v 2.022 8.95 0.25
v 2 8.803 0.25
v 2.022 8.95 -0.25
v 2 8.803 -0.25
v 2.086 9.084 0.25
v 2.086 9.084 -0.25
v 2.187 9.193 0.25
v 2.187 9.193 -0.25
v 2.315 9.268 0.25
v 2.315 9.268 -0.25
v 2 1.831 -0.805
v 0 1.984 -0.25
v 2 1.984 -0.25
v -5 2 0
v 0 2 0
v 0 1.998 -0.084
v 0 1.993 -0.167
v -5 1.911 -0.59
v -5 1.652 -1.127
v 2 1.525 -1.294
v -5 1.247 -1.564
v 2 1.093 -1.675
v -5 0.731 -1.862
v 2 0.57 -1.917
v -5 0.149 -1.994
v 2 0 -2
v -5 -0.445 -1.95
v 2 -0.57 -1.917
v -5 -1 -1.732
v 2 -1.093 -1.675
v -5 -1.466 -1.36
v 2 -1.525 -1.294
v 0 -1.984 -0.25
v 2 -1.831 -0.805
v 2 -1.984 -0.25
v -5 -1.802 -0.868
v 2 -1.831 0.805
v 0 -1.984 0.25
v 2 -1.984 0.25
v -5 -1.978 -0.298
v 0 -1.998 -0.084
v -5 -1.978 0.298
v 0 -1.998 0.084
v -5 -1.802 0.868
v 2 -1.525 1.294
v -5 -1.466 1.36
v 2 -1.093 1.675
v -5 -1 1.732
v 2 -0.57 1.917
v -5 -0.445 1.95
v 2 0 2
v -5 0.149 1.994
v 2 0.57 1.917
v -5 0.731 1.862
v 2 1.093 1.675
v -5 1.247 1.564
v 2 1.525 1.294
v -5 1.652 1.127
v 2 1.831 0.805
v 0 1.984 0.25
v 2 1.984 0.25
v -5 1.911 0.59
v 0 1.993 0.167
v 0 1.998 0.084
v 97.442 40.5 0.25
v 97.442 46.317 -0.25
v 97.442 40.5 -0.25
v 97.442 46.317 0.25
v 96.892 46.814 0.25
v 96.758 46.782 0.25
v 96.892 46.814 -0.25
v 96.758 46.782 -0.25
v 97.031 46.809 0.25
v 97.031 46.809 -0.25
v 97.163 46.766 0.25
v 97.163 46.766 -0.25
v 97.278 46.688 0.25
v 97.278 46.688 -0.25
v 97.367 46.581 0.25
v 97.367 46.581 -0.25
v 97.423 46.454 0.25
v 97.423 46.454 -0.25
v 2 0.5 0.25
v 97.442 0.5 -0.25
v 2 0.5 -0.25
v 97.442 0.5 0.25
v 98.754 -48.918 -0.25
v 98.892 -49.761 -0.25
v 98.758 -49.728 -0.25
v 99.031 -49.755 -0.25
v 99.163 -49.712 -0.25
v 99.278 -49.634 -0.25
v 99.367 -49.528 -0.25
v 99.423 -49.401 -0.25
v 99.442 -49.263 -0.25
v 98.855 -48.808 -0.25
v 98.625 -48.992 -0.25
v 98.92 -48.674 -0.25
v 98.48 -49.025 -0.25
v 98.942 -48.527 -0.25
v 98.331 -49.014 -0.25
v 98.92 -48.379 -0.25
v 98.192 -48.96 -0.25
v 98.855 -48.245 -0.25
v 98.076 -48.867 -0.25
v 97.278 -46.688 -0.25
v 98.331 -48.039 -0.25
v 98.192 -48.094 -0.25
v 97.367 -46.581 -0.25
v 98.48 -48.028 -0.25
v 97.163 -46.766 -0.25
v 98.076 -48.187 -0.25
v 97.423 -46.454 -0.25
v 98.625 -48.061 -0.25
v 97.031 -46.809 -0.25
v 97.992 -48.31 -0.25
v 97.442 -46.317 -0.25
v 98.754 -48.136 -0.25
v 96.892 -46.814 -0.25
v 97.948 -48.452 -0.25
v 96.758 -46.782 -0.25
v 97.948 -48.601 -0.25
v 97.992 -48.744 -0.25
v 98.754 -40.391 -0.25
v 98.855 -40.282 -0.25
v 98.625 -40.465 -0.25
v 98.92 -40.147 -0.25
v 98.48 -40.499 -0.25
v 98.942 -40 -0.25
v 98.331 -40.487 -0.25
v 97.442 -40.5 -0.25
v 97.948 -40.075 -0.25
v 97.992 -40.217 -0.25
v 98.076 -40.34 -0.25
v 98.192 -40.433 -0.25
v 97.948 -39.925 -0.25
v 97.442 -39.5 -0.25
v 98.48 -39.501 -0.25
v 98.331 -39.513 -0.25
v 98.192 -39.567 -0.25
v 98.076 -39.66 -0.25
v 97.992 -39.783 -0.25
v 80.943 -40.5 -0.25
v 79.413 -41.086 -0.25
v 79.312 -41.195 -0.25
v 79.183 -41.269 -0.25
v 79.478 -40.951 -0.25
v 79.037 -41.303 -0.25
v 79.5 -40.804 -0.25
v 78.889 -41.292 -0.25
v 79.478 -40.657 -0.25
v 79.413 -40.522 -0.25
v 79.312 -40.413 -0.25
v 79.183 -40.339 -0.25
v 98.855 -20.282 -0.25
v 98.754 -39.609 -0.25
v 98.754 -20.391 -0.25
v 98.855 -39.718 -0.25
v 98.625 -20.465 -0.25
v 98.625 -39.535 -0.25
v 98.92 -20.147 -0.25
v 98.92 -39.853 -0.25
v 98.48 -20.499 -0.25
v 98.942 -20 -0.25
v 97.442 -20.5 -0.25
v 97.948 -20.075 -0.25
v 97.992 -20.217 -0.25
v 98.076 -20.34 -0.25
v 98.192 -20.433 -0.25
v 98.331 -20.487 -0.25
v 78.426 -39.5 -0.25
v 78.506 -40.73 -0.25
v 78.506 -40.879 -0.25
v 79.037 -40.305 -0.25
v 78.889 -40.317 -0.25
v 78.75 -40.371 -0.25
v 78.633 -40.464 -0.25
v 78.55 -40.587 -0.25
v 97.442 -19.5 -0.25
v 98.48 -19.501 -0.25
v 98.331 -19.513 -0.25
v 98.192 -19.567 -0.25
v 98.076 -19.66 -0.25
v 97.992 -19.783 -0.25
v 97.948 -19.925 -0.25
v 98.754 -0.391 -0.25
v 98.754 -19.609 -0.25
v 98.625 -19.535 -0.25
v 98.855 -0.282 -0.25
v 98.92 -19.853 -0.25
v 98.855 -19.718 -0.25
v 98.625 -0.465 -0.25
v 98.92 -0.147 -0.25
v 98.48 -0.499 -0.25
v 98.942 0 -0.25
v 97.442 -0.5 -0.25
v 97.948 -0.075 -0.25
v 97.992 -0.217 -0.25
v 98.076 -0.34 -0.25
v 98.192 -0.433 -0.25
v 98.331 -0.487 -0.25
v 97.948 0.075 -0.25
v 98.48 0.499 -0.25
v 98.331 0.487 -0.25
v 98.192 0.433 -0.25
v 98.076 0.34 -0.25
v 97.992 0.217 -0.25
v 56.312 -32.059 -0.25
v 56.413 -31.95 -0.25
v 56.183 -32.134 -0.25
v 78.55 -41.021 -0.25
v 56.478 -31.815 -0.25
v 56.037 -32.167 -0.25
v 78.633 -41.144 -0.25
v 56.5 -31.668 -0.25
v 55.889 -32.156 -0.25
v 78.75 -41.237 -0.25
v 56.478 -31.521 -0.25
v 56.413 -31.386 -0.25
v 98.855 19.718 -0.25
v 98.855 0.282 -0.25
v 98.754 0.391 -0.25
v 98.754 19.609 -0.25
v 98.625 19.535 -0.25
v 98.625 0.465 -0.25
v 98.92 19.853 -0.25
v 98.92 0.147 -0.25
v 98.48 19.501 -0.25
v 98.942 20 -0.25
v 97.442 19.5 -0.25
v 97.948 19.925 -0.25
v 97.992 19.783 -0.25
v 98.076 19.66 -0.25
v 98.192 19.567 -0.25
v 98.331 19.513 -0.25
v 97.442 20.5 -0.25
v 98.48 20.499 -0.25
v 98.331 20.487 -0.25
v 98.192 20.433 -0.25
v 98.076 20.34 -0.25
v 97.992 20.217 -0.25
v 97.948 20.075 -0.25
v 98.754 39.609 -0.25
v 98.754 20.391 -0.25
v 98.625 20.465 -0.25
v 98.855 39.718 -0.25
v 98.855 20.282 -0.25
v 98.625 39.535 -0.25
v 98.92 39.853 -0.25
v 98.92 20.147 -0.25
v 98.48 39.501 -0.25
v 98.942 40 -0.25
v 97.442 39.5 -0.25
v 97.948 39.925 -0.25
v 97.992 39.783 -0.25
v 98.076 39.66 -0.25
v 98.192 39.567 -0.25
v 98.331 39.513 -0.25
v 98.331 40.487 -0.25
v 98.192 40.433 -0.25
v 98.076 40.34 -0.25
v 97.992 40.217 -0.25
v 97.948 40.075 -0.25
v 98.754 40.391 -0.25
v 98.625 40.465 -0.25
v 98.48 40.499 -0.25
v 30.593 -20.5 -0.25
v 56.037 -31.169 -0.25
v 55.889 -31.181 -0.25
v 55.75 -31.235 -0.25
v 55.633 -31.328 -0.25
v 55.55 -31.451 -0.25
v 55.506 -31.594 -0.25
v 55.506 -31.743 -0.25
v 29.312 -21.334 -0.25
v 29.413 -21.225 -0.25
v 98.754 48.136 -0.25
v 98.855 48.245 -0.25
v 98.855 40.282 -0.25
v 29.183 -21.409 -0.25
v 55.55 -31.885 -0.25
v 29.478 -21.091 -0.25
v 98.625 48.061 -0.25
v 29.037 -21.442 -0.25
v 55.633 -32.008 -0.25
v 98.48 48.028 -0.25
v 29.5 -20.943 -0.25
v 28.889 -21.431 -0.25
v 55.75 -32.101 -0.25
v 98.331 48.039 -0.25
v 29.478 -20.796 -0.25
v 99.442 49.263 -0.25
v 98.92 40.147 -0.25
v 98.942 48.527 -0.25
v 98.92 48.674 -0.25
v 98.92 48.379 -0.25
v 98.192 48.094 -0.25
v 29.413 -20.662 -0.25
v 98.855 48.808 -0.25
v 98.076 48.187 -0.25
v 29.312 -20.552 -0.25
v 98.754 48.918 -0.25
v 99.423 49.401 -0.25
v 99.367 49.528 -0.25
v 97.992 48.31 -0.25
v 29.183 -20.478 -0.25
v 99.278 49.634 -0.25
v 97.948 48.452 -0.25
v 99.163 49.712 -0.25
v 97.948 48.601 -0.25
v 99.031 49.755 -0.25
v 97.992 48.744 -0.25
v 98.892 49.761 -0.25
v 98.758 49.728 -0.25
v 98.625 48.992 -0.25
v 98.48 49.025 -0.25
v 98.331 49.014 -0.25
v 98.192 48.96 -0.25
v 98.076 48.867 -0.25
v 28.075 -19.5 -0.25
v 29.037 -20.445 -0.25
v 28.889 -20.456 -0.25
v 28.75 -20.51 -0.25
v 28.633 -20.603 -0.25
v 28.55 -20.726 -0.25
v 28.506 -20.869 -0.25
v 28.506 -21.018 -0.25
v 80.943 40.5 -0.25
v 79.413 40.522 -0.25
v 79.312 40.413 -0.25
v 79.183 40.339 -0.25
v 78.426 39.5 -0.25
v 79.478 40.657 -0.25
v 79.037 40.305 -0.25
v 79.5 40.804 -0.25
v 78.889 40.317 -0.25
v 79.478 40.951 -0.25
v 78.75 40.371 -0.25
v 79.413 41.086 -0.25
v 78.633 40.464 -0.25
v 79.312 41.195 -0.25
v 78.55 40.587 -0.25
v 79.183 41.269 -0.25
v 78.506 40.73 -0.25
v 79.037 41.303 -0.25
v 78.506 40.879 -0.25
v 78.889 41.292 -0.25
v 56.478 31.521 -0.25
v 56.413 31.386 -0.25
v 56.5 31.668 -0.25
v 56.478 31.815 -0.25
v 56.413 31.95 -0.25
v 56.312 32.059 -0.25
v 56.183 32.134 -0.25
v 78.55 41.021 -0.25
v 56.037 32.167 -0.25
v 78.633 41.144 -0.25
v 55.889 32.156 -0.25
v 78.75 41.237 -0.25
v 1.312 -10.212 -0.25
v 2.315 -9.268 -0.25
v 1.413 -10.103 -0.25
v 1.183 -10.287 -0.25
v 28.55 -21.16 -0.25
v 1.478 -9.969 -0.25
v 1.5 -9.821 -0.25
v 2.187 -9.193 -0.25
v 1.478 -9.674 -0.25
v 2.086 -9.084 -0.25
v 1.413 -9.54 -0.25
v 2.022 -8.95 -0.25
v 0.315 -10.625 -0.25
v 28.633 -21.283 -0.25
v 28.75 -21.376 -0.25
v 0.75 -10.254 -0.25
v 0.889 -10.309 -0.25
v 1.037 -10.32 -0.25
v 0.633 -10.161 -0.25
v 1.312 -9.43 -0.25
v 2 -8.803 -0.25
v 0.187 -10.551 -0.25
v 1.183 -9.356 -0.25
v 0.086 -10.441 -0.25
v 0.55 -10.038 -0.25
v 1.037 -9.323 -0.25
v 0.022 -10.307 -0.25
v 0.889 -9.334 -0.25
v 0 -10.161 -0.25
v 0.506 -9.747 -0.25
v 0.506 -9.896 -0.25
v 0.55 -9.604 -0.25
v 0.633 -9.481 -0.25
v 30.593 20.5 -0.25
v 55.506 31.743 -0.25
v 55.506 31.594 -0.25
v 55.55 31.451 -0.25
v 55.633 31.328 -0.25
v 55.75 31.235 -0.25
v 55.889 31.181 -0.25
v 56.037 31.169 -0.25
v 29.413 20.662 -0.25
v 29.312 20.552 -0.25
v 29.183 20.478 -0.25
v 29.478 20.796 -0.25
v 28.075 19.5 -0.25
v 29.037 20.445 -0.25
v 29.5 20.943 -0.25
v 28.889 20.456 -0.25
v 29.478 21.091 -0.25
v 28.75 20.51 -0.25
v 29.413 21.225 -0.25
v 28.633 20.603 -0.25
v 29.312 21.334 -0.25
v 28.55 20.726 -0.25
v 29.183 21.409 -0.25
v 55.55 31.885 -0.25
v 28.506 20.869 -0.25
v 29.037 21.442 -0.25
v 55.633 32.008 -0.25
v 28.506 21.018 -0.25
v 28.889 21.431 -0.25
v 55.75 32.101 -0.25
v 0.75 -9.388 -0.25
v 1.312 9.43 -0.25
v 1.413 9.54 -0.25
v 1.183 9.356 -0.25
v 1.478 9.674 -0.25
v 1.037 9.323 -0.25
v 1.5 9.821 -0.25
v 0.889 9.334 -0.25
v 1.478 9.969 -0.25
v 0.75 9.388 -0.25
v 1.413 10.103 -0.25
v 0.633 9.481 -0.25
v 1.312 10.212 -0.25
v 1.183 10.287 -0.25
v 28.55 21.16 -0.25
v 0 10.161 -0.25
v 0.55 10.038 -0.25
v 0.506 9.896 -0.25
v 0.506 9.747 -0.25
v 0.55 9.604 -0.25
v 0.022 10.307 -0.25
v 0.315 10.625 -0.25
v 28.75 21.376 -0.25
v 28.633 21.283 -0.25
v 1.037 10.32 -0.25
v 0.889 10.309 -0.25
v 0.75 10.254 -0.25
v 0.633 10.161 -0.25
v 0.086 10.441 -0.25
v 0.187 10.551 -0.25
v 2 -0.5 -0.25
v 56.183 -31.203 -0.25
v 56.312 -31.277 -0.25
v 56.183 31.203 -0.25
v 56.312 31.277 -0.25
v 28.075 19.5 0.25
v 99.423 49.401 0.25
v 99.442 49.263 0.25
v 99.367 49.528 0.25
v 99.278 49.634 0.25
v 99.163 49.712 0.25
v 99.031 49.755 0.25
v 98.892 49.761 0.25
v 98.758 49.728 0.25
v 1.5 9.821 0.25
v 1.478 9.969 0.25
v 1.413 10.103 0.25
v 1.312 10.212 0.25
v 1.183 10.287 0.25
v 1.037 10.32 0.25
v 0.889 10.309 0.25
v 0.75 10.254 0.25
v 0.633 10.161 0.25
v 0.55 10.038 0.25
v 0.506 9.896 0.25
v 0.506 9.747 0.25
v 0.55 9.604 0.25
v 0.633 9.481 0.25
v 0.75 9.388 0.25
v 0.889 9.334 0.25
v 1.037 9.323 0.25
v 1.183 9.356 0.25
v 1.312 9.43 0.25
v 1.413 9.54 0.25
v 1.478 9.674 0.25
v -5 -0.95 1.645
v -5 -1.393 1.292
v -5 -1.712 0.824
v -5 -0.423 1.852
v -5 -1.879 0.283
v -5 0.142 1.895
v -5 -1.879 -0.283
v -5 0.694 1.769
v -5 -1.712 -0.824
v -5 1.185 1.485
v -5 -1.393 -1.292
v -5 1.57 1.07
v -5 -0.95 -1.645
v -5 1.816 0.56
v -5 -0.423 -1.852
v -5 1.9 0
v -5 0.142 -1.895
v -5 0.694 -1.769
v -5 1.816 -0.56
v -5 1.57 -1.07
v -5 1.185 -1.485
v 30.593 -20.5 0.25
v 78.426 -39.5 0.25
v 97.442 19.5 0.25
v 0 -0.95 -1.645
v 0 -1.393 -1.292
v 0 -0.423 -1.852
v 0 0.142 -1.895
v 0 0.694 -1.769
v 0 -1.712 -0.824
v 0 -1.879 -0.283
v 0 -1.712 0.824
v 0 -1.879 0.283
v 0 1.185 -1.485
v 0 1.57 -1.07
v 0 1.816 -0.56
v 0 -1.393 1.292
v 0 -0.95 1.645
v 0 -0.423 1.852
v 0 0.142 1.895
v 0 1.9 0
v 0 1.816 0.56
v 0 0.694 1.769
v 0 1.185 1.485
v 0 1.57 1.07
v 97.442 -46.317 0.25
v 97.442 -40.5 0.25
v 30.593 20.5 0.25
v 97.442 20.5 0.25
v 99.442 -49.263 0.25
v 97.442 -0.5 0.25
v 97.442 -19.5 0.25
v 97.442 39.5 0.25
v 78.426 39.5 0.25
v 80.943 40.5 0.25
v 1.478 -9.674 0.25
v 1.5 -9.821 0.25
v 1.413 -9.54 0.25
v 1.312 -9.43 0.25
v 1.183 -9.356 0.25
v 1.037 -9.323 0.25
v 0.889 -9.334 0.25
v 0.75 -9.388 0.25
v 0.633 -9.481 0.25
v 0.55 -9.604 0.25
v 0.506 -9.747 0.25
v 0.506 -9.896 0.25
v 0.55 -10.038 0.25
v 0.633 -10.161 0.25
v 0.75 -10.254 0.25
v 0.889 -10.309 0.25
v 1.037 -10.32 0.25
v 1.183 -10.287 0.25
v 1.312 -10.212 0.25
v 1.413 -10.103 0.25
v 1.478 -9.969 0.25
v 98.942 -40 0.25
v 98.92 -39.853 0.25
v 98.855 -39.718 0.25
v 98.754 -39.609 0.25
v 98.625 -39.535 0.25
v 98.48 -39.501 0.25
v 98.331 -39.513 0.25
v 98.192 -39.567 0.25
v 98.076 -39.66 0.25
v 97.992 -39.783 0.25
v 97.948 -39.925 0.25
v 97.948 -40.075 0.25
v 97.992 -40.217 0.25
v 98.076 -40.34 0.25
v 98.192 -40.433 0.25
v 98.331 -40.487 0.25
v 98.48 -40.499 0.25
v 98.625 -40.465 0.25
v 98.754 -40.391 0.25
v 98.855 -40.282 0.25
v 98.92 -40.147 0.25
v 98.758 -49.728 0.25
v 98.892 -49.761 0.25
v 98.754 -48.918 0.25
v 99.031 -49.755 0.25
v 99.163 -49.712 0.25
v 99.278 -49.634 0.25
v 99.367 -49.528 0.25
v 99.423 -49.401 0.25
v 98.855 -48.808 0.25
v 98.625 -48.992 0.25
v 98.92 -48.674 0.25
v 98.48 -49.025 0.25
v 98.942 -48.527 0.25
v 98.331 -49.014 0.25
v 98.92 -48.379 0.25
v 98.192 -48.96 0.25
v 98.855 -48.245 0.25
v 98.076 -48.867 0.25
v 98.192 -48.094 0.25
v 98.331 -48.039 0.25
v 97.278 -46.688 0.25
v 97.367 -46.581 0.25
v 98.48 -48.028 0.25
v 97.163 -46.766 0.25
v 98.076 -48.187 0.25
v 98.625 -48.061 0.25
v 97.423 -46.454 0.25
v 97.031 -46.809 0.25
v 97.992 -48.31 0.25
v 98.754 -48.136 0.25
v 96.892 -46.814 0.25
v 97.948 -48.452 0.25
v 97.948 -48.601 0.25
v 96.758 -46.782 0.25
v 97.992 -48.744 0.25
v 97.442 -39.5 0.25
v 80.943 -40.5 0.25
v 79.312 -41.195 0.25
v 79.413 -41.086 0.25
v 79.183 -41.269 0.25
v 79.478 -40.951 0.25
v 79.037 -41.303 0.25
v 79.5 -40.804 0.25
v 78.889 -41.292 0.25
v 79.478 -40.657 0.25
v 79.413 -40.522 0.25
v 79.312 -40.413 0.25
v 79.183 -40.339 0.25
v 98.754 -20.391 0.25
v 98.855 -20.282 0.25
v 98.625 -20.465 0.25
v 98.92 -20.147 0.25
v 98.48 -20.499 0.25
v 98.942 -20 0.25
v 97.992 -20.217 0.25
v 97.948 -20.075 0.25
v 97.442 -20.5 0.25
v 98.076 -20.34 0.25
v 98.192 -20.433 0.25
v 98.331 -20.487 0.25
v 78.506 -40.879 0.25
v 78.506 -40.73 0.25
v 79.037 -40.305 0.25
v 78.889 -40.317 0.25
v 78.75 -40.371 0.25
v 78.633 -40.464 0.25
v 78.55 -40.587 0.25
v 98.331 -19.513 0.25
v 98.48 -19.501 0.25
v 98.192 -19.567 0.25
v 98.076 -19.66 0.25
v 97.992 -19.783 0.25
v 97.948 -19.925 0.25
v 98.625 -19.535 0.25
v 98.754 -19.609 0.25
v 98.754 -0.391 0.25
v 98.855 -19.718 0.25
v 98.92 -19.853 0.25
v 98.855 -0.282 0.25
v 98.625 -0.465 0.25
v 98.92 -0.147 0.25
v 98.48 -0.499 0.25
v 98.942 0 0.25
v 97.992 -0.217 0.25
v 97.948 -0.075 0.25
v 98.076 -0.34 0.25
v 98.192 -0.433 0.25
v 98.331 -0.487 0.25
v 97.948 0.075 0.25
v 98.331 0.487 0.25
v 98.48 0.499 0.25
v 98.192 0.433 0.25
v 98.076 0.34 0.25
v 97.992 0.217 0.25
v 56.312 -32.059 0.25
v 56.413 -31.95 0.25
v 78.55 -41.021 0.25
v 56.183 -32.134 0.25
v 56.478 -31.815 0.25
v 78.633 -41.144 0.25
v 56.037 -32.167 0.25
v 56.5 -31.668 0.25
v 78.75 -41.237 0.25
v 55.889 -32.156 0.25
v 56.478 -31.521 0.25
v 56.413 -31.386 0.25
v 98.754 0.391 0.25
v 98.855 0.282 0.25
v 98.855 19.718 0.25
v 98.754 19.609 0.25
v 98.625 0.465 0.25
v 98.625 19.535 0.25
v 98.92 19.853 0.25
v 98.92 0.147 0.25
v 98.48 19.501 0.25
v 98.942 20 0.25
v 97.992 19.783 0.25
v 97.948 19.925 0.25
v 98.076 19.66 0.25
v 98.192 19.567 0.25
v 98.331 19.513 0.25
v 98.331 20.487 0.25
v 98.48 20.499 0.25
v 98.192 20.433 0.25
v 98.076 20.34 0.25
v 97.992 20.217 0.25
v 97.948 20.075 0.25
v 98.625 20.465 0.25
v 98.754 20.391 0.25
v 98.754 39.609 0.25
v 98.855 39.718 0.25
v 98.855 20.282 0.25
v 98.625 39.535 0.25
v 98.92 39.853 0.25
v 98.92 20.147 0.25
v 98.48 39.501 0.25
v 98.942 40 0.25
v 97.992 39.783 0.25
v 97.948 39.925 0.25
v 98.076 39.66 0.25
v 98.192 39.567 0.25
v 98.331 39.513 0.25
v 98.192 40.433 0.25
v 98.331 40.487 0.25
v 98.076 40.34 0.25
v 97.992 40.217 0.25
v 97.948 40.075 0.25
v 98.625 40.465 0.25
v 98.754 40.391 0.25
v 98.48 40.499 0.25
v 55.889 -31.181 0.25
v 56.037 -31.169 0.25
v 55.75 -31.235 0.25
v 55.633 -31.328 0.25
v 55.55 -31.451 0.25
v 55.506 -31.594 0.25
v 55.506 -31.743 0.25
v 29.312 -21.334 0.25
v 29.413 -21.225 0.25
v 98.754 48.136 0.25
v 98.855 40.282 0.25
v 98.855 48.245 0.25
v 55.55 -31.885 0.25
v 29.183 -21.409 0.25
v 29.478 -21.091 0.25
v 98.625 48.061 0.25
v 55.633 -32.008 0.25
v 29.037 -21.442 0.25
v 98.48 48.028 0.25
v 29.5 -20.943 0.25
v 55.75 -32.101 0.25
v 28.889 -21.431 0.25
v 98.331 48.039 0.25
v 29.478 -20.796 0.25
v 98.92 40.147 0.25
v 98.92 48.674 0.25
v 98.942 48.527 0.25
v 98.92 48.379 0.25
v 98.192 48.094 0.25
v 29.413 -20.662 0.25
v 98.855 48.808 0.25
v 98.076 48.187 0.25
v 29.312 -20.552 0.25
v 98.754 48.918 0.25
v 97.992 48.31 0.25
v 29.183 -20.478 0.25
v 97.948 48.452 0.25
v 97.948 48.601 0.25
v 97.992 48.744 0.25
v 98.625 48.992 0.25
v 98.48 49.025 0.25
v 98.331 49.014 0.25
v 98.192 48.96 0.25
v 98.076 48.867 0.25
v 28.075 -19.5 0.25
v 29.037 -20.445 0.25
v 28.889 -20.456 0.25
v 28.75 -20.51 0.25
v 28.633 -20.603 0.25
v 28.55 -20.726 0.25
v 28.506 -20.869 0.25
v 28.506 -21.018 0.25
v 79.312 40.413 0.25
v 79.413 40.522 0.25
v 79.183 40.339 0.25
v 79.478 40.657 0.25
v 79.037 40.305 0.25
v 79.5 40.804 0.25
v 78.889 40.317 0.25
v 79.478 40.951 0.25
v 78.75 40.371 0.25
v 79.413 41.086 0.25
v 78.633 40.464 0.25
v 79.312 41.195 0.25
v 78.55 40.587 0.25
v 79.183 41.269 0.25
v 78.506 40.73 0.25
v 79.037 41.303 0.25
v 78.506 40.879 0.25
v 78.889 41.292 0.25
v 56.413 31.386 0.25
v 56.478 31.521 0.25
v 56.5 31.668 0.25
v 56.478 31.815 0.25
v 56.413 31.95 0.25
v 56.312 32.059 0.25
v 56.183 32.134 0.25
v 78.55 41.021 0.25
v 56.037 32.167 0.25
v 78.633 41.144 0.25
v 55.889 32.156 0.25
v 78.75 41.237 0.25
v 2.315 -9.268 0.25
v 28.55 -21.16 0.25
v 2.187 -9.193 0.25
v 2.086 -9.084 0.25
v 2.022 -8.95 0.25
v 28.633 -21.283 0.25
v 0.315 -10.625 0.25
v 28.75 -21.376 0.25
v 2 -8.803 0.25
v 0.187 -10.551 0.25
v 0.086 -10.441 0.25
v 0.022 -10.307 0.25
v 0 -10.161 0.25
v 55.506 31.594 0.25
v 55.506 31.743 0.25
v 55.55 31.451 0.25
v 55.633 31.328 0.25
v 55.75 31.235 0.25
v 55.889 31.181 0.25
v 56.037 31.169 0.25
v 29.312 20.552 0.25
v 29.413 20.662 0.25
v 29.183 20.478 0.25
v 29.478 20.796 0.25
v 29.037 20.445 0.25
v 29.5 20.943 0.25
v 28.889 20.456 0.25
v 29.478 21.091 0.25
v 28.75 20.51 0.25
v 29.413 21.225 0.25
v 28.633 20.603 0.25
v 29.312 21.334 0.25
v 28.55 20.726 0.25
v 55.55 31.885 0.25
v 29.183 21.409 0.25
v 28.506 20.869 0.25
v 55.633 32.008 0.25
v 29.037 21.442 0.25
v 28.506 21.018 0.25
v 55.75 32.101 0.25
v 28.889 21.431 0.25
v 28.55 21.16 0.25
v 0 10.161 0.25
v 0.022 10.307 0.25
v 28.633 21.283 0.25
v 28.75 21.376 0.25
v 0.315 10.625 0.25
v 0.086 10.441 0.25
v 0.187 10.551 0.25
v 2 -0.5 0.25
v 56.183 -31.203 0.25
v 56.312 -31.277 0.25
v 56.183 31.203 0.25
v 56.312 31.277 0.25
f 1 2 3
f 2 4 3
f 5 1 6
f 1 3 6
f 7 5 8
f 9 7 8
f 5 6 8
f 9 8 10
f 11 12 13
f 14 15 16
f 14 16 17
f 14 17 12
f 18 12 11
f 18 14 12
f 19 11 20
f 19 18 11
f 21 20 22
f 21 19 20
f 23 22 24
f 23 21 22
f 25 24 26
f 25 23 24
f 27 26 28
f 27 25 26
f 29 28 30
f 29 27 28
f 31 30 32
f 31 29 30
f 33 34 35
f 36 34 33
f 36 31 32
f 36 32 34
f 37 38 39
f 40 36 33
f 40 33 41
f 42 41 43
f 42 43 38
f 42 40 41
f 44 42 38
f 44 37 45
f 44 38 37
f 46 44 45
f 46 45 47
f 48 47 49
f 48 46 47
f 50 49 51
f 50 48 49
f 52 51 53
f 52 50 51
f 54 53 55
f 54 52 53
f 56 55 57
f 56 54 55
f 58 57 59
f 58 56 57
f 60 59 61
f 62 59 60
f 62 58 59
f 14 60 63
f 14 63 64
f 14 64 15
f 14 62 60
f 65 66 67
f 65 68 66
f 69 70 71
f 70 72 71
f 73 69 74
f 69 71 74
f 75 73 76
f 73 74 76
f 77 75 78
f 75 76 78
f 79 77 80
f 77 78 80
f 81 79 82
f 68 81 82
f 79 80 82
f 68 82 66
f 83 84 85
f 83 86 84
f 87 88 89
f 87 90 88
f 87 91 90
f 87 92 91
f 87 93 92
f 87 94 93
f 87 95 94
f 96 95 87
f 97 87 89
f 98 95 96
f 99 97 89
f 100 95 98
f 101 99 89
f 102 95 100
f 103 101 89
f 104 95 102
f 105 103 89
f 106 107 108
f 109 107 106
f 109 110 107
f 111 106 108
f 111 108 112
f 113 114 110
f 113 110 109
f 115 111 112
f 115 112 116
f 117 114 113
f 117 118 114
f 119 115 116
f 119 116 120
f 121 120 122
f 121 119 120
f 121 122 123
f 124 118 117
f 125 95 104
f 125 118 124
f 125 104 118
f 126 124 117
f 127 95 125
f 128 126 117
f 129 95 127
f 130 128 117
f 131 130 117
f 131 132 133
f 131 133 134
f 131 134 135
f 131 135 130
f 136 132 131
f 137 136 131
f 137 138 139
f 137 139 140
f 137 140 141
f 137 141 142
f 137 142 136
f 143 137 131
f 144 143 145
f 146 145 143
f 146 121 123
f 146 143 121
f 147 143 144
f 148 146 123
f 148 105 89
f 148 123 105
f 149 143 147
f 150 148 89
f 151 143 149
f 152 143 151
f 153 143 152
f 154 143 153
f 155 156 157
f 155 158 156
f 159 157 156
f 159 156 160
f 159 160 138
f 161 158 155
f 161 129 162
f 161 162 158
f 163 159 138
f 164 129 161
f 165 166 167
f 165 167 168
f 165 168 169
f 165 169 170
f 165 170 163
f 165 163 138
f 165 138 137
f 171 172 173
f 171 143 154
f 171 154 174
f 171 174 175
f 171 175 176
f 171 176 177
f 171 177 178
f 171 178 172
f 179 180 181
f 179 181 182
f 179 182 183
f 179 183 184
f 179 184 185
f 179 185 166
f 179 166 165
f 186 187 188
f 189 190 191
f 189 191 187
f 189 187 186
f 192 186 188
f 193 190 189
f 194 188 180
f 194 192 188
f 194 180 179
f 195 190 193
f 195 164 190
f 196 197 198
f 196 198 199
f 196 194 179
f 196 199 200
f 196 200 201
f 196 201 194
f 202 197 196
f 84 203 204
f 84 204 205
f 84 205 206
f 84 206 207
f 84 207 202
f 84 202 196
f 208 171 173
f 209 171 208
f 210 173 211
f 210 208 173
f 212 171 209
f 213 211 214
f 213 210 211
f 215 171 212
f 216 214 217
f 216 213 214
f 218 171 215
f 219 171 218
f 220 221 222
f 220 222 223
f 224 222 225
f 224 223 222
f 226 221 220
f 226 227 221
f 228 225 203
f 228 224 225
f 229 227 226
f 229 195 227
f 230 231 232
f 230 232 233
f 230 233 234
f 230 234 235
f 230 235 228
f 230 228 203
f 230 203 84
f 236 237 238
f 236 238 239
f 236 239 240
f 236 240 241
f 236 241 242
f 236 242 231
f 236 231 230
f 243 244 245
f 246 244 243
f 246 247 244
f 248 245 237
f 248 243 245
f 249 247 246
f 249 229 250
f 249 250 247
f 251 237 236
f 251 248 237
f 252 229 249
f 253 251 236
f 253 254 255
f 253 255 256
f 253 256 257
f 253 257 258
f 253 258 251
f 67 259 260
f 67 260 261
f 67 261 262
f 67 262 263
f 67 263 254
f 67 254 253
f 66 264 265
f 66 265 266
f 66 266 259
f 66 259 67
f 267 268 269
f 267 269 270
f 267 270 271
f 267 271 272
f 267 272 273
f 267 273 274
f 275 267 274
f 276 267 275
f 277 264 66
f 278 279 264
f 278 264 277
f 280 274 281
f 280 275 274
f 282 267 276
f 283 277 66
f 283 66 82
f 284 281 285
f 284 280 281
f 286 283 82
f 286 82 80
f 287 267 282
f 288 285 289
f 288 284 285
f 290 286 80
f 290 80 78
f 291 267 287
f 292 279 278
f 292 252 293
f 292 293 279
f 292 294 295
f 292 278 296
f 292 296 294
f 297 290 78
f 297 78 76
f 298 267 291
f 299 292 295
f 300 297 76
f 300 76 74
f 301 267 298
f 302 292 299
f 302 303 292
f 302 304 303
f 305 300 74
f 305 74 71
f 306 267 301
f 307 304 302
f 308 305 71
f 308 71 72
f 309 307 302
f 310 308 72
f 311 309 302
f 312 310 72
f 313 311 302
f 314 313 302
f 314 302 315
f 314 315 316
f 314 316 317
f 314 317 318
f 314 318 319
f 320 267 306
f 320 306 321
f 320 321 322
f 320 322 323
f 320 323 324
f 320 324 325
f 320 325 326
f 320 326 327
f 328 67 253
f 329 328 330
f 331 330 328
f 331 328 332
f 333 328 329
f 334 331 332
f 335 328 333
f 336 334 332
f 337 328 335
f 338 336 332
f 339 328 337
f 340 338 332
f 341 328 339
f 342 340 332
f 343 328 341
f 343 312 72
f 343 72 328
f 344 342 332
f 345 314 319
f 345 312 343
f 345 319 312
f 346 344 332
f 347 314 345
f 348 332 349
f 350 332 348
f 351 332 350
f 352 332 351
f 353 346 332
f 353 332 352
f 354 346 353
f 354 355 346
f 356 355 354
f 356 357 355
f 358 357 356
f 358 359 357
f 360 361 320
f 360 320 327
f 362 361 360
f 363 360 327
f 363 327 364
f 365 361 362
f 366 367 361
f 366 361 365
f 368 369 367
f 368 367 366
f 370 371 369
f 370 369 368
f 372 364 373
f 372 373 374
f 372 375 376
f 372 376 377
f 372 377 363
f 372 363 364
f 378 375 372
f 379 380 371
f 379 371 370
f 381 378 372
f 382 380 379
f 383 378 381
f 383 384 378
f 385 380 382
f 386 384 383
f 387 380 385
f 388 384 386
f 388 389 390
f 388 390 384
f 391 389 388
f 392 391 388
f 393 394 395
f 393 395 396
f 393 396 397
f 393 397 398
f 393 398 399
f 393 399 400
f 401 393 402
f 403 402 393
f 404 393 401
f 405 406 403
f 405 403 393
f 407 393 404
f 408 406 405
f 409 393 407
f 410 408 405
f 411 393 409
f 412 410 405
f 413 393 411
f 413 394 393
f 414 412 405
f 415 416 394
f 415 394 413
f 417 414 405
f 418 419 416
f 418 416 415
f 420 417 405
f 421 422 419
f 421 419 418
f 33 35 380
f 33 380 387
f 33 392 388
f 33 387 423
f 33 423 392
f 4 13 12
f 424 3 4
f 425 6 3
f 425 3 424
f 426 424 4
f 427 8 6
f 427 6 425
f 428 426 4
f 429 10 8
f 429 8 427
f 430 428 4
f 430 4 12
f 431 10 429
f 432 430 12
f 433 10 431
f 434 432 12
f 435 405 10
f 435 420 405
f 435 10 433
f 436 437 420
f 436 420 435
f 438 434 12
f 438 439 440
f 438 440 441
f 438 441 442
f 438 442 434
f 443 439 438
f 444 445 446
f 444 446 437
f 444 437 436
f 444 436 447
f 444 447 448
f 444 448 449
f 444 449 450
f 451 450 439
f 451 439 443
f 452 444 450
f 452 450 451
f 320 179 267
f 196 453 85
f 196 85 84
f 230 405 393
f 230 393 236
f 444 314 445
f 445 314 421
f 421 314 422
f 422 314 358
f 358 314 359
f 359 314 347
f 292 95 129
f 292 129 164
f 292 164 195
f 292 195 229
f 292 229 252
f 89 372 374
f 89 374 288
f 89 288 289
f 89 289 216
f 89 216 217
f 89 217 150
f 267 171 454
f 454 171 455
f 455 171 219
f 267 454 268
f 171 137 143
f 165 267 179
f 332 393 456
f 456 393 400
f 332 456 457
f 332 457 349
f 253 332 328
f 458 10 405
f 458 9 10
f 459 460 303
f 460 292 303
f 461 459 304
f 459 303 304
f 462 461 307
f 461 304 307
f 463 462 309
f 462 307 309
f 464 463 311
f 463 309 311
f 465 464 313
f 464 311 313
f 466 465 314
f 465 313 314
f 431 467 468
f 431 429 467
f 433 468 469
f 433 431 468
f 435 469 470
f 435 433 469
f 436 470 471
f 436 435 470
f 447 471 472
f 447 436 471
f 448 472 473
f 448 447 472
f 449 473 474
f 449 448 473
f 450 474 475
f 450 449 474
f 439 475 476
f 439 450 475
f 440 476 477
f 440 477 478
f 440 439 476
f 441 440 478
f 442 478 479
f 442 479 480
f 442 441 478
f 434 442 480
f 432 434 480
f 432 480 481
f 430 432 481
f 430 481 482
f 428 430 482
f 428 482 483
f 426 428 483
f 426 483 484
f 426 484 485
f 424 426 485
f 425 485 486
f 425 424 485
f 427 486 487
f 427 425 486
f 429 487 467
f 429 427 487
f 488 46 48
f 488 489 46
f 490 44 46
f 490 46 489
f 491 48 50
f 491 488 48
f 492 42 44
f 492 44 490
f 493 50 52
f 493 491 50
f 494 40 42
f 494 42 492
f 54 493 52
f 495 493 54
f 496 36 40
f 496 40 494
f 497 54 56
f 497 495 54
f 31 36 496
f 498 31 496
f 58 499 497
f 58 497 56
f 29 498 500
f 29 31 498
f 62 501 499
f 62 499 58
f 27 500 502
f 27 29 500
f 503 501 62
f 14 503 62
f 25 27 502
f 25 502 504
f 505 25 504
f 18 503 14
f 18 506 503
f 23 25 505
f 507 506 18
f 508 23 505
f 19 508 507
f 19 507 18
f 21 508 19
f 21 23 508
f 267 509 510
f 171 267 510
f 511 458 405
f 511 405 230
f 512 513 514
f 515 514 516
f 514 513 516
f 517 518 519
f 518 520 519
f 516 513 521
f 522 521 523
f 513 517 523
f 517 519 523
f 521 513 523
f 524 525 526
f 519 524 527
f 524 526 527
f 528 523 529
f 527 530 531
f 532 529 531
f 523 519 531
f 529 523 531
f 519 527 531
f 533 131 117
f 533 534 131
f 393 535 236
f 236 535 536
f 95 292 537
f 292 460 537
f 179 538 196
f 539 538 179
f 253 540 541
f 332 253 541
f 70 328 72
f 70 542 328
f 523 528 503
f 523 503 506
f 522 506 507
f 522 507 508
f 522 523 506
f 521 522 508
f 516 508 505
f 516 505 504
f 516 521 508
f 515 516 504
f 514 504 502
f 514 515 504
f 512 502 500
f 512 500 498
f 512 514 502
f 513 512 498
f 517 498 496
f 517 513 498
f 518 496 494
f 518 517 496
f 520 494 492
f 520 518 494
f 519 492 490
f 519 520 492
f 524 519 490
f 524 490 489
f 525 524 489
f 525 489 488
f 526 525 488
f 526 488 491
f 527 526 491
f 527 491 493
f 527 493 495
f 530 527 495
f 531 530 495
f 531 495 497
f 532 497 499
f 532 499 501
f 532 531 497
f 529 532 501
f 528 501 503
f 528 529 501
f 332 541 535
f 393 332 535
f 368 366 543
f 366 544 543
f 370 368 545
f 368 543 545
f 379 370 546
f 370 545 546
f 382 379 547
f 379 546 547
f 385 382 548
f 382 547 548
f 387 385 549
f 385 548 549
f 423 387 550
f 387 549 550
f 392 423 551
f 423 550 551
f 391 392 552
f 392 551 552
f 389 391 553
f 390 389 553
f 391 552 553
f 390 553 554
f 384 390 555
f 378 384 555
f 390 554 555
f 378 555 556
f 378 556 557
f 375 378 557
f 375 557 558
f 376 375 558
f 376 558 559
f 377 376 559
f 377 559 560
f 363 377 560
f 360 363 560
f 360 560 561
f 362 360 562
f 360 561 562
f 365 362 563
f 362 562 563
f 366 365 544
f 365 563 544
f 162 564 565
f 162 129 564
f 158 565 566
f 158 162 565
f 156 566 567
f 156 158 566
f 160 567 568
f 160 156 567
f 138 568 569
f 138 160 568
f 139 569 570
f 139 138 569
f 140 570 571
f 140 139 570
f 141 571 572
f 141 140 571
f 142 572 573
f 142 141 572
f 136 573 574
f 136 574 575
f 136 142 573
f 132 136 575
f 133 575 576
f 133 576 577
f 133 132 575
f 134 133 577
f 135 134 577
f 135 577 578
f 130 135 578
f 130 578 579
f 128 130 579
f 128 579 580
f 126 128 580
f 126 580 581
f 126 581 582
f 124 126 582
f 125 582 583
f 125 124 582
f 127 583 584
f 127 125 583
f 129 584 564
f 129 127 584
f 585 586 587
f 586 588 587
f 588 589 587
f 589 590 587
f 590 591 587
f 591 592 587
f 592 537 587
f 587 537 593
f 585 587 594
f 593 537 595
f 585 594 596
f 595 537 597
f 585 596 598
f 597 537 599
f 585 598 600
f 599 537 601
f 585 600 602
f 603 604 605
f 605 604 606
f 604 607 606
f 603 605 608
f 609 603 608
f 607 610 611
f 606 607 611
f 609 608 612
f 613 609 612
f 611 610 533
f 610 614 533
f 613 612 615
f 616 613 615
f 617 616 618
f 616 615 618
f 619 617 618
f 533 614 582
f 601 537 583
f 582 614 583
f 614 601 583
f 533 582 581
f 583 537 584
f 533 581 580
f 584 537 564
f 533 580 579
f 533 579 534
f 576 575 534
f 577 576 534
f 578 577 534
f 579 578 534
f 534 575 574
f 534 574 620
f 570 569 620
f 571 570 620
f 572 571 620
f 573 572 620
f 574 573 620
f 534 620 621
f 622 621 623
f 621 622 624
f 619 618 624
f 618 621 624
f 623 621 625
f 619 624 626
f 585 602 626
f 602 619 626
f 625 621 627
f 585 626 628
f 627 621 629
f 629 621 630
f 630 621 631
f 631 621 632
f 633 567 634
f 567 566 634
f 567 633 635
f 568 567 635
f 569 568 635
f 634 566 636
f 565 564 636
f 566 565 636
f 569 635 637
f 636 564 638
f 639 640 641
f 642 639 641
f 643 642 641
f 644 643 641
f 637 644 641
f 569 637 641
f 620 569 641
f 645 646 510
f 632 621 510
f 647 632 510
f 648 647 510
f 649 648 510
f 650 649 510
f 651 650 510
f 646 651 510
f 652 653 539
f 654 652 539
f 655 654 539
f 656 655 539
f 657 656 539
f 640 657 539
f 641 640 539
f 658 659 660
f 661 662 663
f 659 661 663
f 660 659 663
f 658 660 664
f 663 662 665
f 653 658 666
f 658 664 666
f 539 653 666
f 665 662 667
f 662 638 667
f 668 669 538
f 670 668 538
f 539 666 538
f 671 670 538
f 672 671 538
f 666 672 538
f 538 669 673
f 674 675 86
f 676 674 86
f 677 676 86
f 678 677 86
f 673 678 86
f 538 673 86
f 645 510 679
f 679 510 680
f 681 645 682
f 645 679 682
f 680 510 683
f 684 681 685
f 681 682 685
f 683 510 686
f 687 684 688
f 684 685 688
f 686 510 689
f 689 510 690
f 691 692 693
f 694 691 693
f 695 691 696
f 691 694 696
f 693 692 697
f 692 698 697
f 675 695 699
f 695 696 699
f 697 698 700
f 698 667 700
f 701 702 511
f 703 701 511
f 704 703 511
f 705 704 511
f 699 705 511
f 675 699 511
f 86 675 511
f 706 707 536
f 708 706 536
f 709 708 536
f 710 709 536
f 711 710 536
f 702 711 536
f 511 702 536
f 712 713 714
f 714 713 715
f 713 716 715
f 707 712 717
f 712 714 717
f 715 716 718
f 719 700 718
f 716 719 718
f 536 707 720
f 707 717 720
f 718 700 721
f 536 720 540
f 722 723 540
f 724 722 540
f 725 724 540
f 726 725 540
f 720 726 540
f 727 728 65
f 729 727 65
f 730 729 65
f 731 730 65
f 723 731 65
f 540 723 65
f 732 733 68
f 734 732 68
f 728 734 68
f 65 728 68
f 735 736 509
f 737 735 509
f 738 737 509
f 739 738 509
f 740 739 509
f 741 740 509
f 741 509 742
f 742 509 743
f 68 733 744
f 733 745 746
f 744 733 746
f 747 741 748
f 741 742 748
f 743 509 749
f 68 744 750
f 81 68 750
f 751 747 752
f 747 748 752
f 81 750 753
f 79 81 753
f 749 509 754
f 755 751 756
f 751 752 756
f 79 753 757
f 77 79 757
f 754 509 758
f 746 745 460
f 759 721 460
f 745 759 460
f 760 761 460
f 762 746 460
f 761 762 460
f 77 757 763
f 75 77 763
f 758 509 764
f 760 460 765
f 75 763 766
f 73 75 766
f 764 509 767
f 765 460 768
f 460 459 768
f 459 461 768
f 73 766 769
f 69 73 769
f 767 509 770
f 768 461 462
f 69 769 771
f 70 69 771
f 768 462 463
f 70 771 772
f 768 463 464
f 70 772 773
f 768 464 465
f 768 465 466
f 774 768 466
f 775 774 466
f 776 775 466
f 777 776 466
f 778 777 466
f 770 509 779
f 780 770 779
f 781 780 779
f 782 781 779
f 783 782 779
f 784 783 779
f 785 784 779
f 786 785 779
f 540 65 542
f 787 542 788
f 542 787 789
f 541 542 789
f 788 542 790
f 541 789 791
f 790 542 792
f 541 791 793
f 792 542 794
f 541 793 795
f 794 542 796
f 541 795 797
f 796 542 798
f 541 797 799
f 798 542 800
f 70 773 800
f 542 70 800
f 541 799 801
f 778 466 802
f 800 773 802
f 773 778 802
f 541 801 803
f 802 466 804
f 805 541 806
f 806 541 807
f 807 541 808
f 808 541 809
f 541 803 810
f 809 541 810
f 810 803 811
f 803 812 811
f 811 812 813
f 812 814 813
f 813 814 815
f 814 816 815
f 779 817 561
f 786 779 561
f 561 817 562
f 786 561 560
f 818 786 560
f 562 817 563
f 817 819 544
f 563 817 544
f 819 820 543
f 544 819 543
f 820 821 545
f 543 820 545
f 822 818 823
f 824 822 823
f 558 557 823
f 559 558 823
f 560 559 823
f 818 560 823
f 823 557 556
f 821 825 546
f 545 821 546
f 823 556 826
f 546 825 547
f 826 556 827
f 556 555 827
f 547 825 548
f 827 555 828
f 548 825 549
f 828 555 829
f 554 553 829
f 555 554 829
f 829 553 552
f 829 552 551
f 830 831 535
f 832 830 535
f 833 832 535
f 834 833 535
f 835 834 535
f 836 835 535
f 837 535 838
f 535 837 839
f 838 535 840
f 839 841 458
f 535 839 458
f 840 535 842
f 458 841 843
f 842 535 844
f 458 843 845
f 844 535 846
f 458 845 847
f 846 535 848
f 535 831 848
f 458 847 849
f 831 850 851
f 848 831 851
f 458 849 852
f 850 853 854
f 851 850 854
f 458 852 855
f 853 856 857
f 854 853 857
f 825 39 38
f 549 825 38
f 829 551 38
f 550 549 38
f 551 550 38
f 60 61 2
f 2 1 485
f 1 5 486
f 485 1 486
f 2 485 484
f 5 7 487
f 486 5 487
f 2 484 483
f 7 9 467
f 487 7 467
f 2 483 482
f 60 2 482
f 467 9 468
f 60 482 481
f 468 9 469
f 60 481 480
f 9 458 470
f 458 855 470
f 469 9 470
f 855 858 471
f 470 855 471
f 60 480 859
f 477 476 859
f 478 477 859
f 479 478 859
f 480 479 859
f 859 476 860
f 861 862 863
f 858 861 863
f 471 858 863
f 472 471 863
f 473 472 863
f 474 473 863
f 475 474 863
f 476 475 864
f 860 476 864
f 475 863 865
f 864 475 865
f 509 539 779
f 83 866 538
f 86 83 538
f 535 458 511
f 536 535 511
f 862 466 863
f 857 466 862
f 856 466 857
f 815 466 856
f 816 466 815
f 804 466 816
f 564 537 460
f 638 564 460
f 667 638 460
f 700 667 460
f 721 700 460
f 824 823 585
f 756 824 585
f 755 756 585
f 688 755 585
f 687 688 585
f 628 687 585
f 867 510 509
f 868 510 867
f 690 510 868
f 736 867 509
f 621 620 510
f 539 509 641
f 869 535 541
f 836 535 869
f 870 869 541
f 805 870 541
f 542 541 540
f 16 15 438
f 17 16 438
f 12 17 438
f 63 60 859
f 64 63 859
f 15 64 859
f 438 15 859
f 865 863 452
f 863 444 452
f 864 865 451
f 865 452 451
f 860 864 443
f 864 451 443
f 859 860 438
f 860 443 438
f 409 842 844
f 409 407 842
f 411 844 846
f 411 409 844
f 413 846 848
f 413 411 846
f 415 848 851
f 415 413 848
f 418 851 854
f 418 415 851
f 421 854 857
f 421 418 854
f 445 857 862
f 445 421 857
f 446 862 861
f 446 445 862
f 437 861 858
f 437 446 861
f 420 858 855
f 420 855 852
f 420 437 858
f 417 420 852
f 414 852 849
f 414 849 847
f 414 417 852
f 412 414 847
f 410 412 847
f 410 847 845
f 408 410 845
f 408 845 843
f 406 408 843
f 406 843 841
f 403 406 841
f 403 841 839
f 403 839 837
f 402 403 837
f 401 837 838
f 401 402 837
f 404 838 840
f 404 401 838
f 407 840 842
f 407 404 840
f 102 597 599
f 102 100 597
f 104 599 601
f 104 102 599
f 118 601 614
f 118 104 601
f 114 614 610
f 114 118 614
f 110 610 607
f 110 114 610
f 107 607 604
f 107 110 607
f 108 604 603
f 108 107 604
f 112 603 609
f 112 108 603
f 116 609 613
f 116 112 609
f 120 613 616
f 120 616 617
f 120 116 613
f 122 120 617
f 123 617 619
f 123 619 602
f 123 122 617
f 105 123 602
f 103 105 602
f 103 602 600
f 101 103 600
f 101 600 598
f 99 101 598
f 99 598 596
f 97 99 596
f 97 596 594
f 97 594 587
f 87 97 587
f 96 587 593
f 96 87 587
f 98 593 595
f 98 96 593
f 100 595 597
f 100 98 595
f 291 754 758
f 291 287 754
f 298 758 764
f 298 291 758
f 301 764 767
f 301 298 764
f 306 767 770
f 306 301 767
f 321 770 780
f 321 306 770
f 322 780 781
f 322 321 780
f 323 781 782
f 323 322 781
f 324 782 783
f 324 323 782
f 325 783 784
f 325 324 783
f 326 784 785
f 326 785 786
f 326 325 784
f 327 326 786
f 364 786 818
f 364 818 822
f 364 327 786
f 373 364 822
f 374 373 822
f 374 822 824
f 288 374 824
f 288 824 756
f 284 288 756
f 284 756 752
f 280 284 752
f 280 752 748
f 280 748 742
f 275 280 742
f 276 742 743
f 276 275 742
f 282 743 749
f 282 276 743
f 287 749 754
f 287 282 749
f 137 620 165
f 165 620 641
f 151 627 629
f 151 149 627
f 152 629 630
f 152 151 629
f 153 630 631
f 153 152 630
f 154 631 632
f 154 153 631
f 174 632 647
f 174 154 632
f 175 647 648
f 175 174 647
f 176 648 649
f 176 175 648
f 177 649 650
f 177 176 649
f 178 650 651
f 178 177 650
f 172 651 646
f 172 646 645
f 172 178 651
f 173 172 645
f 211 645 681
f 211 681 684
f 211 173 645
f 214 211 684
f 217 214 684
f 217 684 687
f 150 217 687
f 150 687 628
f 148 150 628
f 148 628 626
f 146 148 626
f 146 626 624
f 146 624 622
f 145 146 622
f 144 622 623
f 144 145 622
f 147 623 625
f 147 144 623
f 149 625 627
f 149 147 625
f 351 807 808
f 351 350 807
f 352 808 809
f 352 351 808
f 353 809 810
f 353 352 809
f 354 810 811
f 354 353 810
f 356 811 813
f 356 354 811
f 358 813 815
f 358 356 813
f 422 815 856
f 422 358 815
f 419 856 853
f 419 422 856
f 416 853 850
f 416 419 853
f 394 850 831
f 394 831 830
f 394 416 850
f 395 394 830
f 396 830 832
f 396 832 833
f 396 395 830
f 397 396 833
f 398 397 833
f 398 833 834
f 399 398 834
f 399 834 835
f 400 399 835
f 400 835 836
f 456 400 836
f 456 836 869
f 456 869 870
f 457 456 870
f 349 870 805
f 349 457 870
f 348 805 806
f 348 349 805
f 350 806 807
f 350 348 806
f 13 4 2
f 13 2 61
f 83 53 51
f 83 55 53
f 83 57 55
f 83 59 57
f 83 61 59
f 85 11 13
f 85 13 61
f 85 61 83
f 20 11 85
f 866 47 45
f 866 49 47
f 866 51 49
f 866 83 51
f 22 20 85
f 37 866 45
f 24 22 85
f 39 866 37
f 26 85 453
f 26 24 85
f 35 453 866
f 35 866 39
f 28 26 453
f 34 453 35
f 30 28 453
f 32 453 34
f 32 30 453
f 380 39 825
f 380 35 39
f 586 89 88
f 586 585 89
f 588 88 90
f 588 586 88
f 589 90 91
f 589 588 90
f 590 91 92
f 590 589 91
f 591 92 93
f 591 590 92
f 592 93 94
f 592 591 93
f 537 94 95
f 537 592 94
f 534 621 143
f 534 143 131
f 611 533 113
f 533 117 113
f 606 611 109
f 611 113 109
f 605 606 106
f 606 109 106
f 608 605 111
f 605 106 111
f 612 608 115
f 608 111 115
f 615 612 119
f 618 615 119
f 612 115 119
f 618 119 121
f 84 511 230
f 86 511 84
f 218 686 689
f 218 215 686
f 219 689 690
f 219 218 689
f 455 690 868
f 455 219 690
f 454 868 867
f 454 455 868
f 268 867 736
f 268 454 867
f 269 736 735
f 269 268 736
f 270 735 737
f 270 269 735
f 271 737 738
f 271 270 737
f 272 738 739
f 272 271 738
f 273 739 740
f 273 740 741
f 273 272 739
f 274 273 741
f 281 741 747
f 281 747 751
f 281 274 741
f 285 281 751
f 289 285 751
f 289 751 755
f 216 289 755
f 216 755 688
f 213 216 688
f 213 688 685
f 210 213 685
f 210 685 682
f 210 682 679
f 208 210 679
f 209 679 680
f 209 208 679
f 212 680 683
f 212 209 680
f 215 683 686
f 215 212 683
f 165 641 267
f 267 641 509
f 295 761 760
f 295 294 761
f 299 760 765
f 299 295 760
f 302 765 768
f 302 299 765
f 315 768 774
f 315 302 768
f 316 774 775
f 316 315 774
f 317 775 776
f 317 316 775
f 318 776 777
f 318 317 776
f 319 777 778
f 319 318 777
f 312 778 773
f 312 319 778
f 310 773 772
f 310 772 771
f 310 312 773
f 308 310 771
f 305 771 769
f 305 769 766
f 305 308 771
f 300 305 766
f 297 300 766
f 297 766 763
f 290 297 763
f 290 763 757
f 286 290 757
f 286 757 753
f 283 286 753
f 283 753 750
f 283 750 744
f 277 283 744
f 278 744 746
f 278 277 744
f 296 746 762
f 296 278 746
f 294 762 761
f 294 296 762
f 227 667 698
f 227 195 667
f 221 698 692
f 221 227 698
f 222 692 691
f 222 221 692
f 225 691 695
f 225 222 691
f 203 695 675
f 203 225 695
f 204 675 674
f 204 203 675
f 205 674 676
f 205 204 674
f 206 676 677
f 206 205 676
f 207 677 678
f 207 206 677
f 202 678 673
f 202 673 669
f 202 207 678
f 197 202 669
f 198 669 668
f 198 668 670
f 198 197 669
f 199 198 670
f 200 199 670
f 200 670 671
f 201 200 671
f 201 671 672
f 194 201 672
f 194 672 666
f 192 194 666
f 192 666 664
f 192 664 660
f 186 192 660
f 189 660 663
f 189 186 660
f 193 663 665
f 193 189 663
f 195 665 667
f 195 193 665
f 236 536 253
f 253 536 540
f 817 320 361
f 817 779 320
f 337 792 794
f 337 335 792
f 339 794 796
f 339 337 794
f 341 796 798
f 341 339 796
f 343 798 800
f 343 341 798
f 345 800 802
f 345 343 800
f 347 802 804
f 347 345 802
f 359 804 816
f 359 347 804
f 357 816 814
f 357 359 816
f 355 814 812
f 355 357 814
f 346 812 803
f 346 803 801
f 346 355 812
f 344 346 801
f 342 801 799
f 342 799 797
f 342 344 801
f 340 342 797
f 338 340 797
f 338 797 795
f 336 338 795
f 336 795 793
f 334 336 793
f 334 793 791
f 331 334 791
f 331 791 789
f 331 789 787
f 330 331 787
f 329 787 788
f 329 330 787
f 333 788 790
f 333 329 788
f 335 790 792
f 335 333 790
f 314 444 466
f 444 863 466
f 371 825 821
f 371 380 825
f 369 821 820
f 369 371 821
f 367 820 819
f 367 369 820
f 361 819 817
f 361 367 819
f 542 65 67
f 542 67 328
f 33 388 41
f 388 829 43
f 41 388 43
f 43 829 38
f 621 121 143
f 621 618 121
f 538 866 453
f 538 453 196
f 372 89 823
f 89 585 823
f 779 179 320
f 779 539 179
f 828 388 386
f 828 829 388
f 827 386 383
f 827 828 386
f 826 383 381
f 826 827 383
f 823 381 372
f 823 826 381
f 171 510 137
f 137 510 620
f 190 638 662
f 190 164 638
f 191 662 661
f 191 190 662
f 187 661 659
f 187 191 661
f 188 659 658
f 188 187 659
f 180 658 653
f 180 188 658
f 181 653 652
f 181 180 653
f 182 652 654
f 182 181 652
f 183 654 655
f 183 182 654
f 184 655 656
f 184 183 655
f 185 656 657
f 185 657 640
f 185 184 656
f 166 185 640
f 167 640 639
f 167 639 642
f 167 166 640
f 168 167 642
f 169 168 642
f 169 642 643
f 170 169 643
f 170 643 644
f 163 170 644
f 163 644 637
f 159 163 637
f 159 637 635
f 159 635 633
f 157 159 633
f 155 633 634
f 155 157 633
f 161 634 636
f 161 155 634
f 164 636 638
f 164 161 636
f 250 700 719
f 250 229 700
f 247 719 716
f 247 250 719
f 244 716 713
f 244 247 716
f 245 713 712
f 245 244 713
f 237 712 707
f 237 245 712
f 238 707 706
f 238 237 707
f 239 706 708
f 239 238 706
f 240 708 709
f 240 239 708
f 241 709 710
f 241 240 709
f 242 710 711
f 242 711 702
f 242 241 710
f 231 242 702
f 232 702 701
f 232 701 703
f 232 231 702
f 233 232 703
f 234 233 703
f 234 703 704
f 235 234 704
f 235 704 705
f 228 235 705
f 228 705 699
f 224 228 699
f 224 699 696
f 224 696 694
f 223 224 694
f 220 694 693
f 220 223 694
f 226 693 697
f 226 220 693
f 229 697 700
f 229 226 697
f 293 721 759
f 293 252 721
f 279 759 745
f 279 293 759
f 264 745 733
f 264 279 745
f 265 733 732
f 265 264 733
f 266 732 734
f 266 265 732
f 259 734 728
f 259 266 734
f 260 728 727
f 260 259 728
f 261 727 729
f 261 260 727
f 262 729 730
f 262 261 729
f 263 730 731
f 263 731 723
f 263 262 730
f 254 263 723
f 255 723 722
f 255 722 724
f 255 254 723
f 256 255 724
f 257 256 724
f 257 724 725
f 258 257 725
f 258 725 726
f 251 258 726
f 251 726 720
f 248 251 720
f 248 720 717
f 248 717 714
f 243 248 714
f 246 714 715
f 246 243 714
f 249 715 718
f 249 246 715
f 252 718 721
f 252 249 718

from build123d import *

# Parameters (mm, degrees)
EXTRUDE_1_DEPTH     = 0.25
SKETCH_4_R          = 0.5
CUT_EXTRUDE_1_DEPTH = 0.25
FILLET_1_R          = 0.5


with BuildPart() as part:
    # 草图1 → 凸台-拉伸1 (new body, symmetric)
    with BuildSketch(Plane.XY):
        Polygon((0, -10.5), (0, 10.5), (99.442194264, 50), (99.442194264, -50), align=None)
        Polygon((2, 9.142427382), (28.075436668, 19.5), (97.442194264, 19.5), (97.442194264, 0.5), (2, 0.5), align=None, mode=Mode.SUBTRACT)
        Polygon((97.442194264, 47.053564614), (97.442194264, 40.5), (80.943438681, 40.5), align=None, mode=Mode.SUBTRACT)
        Polygon((97.442194264, -47.053564614), (80.943438681, -40.5), (97.442194264, -40.5), align=None, mode=Mode.SUBTRACT)
        Polygon((2, -9.142427382), (2, -0.5), (97.442194264, -0.5), (97.442194264, -19.5), (28.075436668, -19.5), align=None, mode=Mode.SUBTRACT)
        Polygon((30.592960573, 20.5), (97.442194264, 20.5), (97.442194264, 39.5), (78.425914776, 39.5), align=None, mode=Mode.SUBTRACT)
        Polygon((78.425914776, -39.5), (97.442194264, -39.5), (97.442194264, -20.5), (30.592960573, -20.5), align=None, mode=Mode.SUBTRACT)
    extrude(amount=EXTRUDE_1_DEPTH, both=True)

    # 草图4 → 切除-拉伸1 (cut, symmetric)
    with BuildSketch(Plane.XY):
        with Locations((1, 9.821213691)):
            Circle(SKETCH_4_R)
        with Locations((29, 20.943253065)):
            Circle(SKETCH_4_R)
        with Locations((56, 31.668076746)):
            Circle(SKETCH_4_R)
        with Locations((79, 40.80403766)):
            Circle(SKETCH_4_R)
        with Locations((98.442194264, 48.526782307)):
            Circle(SKETCH_4_R)
        with Locations((98.442194264, 40)):
            Circle(SKETCH_4_R)
        with Locations((98.442194264, 20)):
            Circle(SKETCH_4_R)
        with Locations((98.442194264, 0)):
            Circle(SKETCH_4_R)
        with Locations((98.442194264, -20)):
            Circle(SKETCH_4_R)
        with Locations((98.442194264, -40)):
            Circle(SKETCH_4_R)
        with Locations((98.442194264, -48.526782307)):
            Circle(SKETCH_4_R)
        with Locations((79, -40.80403766)):
            Circle(SKETCH_4_R)
        with Locations((56, -31.668076746)):
            Circle(SKETCH_4_R)
        with Locations((29, -20.943253065)):
            Circle(SKETCH_4_R)
        with Locations((1, -9.821213691)):
            Circle(SKETCH_4_R)
    extrude(amount=CUT_EXTRUDE_1_DEPTH, both=True, mode=Mode.SUBTRACT)

    # 草图5 → 旋转1 (revolve)
    with BuildSketch(Plane.XY):
        Polygon((2, 0), (2, 2), (-5, 2), (-5, 1.9), (0, 1.9), (0, 0), align=None)
    revolve(axis=Axis((0, 0, 0), (-1, 0, 0)))

    # 圆角1
    fillet_1_edges = [part.edges().sort_by_distance(p)[0] for p in [
        (2, 9.142427382, 0),
        (97.442194264, 47.053564614, 0),
        (97.442194264, -47.053564614, 0),
        (2, -9.142427382, 0),
        (99.442194264, 50, 0),
        (99.442194264, -50, 0),
        (0, -10.5, 0),
        (0, 10.5, 0),
    ]]
    fillet(fillet_1_edges, radius=FILLET_1_R)


solid = part.part
